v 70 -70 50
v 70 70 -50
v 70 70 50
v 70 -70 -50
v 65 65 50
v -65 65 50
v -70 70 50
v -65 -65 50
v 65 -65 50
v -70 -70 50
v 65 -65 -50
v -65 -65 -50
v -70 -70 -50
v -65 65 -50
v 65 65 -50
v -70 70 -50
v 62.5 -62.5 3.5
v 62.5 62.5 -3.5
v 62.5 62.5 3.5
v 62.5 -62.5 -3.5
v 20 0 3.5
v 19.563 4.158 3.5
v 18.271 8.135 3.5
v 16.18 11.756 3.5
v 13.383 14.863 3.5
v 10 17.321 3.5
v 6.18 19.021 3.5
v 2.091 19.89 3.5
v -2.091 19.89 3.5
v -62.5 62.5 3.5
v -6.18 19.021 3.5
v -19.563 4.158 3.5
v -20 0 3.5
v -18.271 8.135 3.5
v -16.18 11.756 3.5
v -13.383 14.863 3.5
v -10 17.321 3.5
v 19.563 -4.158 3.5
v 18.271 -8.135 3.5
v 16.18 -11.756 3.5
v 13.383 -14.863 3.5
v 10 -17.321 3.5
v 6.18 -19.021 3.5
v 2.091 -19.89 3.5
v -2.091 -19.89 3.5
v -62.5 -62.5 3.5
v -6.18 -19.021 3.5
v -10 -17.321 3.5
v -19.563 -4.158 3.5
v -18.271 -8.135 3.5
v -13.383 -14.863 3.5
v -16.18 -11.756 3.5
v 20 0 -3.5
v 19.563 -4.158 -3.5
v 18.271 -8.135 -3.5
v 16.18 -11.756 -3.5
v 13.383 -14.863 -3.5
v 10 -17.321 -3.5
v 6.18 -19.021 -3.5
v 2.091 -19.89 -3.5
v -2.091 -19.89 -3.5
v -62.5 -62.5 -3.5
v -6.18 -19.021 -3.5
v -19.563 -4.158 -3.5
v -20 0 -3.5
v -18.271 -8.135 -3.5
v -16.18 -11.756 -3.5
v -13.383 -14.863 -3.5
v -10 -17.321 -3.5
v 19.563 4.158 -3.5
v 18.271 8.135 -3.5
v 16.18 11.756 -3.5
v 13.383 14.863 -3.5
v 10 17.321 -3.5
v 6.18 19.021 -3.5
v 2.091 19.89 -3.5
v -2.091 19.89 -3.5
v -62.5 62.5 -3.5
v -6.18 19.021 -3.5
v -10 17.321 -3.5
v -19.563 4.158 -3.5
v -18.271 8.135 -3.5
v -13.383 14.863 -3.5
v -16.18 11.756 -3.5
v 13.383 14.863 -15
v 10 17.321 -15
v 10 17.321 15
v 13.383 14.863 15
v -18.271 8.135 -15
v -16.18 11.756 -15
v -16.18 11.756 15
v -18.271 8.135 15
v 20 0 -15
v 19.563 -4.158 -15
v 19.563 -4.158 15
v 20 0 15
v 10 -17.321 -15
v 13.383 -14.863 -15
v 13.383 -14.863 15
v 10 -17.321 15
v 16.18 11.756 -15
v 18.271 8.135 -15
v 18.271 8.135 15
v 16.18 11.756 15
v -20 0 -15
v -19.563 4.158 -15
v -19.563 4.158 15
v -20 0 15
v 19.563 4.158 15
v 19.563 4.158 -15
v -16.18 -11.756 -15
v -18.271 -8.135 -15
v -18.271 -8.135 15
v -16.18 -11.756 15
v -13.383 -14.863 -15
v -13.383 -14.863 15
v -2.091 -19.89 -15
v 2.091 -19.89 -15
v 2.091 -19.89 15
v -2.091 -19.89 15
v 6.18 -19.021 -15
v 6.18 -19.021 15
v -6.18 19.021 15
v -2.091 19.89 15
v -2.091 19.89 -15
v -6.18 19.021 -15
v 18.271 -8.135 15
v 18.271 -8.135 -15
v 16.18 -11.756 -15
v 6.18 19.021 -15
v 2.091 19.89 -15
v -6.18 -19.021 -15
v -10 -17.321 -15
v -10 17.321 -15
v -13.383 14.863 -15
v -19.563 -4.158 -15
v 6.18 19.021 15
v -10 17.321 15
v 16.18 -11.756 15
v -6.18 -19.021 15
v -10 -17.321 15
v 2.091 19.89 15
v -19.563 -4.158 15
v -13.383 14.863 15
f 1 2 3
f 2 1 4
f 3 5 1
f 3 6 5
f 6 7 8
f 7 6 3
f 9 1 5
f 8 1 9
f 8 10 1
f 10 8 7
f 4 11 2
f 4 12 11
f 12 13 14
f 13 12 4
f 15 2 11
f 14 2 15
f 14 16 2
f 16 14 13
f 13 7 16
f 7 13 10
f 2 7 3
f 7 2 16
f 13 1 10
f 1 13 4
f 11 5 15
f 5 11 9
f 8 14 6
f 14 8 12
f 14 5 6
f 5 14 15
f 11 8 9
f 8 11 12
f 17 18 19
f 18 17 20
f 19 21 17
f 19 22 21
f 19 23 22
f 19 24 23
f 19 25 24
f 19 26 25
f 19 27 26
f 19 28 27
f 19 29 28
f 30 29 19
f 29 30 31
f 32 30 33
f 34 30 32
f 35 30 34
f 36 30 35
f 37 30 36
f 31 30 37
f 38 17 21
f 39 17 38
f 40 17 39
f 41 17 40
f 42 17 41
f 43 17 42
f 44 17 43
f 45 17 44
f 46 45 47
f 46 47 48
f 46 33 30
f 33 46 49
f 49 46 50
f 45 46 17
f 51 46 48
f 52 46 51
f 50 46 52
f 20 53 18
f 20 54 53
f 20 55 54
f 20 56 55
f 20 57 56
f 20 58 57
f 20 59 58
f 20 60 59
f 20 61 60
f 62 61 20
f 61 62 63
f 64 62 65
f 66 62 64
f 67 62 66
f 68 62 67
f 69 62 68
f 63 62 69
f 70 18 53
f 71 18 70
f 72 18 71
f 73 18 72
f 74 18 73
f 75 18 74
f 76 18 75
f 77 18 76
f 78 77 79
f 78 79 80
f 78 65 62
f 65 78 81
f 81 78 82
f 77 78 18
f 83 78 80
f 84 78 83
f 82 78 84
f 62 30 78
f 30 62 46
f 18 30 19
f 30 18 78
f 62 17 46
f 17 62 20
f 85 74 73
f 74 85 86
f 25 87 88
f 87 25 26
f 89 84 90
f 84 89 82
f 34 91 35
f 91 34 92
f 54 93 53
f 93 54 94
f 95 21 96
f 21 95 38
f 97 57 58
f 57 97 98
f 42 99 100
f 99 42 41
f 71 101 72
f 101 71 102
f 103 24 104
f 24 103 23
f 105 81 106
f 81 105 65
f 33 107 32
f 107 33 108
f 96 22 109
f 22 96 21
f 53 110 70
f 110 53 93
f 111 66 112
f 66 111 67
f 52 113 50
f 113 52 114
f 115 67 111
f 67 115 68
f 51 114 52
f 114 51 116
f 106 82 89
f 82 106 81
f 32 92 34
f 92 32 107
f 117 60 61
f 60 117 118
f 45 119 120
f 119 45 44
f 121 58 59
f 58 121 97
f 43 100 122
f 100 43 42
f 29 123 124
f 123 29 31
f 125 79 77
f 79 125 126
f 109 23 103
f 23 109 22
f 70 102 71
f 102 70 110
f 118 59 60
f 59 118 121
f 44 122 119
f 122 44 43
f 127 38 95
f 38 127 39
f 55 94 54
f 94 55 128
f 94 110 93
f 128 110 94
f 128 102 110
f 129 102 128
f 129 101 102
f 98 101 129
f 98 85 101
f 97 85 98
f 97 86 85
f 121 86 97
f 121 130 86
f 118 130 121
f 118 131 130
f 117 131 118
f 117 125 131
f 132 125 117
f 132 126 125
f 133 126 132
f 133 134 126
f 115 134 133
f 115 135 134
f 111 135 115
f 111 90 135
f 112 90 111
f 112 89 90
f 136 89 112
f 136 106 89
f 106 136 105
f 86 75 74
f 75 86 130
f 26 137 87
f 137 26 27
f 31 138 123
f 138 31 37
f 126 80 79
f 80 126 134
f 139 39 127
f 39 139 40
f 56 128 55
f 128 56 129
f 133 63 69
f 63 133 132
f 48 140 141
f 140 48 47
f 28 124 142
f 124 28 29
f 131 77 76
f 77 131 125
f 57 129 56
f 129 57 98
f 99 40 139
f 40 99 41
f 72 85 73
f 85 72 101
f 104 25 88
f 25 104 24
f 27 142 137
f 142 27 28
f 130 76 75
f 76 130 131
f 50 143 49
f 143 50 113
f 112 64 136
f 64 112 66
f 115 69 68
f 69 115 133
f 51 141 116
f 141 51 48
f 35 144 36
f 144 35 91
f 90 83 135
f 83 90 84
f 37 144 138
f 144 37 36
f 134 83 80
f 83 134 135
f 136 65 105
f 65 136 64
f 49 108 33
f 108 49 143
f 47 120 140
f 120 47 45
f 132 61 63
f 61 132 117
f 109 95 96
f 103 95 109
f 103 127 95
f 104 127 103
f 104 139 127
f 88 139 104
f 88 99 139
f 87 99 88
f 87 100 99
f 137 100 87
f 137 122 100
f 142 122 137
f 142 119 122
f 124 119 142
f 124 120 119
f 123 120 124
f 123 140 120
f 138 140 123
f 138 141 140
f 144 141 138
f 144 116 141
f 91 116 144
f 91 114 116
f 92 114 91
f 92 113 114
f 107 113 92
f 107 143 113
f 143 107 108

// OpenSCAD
union() {
difference() {
cube([140,140,100],center=true); 
cube([130,130,200],center=true); 
}
union() {
cube([125,125,7],center=true); 
cylinder(30,20,20,center=true,$fs=0.02); 
}
}
